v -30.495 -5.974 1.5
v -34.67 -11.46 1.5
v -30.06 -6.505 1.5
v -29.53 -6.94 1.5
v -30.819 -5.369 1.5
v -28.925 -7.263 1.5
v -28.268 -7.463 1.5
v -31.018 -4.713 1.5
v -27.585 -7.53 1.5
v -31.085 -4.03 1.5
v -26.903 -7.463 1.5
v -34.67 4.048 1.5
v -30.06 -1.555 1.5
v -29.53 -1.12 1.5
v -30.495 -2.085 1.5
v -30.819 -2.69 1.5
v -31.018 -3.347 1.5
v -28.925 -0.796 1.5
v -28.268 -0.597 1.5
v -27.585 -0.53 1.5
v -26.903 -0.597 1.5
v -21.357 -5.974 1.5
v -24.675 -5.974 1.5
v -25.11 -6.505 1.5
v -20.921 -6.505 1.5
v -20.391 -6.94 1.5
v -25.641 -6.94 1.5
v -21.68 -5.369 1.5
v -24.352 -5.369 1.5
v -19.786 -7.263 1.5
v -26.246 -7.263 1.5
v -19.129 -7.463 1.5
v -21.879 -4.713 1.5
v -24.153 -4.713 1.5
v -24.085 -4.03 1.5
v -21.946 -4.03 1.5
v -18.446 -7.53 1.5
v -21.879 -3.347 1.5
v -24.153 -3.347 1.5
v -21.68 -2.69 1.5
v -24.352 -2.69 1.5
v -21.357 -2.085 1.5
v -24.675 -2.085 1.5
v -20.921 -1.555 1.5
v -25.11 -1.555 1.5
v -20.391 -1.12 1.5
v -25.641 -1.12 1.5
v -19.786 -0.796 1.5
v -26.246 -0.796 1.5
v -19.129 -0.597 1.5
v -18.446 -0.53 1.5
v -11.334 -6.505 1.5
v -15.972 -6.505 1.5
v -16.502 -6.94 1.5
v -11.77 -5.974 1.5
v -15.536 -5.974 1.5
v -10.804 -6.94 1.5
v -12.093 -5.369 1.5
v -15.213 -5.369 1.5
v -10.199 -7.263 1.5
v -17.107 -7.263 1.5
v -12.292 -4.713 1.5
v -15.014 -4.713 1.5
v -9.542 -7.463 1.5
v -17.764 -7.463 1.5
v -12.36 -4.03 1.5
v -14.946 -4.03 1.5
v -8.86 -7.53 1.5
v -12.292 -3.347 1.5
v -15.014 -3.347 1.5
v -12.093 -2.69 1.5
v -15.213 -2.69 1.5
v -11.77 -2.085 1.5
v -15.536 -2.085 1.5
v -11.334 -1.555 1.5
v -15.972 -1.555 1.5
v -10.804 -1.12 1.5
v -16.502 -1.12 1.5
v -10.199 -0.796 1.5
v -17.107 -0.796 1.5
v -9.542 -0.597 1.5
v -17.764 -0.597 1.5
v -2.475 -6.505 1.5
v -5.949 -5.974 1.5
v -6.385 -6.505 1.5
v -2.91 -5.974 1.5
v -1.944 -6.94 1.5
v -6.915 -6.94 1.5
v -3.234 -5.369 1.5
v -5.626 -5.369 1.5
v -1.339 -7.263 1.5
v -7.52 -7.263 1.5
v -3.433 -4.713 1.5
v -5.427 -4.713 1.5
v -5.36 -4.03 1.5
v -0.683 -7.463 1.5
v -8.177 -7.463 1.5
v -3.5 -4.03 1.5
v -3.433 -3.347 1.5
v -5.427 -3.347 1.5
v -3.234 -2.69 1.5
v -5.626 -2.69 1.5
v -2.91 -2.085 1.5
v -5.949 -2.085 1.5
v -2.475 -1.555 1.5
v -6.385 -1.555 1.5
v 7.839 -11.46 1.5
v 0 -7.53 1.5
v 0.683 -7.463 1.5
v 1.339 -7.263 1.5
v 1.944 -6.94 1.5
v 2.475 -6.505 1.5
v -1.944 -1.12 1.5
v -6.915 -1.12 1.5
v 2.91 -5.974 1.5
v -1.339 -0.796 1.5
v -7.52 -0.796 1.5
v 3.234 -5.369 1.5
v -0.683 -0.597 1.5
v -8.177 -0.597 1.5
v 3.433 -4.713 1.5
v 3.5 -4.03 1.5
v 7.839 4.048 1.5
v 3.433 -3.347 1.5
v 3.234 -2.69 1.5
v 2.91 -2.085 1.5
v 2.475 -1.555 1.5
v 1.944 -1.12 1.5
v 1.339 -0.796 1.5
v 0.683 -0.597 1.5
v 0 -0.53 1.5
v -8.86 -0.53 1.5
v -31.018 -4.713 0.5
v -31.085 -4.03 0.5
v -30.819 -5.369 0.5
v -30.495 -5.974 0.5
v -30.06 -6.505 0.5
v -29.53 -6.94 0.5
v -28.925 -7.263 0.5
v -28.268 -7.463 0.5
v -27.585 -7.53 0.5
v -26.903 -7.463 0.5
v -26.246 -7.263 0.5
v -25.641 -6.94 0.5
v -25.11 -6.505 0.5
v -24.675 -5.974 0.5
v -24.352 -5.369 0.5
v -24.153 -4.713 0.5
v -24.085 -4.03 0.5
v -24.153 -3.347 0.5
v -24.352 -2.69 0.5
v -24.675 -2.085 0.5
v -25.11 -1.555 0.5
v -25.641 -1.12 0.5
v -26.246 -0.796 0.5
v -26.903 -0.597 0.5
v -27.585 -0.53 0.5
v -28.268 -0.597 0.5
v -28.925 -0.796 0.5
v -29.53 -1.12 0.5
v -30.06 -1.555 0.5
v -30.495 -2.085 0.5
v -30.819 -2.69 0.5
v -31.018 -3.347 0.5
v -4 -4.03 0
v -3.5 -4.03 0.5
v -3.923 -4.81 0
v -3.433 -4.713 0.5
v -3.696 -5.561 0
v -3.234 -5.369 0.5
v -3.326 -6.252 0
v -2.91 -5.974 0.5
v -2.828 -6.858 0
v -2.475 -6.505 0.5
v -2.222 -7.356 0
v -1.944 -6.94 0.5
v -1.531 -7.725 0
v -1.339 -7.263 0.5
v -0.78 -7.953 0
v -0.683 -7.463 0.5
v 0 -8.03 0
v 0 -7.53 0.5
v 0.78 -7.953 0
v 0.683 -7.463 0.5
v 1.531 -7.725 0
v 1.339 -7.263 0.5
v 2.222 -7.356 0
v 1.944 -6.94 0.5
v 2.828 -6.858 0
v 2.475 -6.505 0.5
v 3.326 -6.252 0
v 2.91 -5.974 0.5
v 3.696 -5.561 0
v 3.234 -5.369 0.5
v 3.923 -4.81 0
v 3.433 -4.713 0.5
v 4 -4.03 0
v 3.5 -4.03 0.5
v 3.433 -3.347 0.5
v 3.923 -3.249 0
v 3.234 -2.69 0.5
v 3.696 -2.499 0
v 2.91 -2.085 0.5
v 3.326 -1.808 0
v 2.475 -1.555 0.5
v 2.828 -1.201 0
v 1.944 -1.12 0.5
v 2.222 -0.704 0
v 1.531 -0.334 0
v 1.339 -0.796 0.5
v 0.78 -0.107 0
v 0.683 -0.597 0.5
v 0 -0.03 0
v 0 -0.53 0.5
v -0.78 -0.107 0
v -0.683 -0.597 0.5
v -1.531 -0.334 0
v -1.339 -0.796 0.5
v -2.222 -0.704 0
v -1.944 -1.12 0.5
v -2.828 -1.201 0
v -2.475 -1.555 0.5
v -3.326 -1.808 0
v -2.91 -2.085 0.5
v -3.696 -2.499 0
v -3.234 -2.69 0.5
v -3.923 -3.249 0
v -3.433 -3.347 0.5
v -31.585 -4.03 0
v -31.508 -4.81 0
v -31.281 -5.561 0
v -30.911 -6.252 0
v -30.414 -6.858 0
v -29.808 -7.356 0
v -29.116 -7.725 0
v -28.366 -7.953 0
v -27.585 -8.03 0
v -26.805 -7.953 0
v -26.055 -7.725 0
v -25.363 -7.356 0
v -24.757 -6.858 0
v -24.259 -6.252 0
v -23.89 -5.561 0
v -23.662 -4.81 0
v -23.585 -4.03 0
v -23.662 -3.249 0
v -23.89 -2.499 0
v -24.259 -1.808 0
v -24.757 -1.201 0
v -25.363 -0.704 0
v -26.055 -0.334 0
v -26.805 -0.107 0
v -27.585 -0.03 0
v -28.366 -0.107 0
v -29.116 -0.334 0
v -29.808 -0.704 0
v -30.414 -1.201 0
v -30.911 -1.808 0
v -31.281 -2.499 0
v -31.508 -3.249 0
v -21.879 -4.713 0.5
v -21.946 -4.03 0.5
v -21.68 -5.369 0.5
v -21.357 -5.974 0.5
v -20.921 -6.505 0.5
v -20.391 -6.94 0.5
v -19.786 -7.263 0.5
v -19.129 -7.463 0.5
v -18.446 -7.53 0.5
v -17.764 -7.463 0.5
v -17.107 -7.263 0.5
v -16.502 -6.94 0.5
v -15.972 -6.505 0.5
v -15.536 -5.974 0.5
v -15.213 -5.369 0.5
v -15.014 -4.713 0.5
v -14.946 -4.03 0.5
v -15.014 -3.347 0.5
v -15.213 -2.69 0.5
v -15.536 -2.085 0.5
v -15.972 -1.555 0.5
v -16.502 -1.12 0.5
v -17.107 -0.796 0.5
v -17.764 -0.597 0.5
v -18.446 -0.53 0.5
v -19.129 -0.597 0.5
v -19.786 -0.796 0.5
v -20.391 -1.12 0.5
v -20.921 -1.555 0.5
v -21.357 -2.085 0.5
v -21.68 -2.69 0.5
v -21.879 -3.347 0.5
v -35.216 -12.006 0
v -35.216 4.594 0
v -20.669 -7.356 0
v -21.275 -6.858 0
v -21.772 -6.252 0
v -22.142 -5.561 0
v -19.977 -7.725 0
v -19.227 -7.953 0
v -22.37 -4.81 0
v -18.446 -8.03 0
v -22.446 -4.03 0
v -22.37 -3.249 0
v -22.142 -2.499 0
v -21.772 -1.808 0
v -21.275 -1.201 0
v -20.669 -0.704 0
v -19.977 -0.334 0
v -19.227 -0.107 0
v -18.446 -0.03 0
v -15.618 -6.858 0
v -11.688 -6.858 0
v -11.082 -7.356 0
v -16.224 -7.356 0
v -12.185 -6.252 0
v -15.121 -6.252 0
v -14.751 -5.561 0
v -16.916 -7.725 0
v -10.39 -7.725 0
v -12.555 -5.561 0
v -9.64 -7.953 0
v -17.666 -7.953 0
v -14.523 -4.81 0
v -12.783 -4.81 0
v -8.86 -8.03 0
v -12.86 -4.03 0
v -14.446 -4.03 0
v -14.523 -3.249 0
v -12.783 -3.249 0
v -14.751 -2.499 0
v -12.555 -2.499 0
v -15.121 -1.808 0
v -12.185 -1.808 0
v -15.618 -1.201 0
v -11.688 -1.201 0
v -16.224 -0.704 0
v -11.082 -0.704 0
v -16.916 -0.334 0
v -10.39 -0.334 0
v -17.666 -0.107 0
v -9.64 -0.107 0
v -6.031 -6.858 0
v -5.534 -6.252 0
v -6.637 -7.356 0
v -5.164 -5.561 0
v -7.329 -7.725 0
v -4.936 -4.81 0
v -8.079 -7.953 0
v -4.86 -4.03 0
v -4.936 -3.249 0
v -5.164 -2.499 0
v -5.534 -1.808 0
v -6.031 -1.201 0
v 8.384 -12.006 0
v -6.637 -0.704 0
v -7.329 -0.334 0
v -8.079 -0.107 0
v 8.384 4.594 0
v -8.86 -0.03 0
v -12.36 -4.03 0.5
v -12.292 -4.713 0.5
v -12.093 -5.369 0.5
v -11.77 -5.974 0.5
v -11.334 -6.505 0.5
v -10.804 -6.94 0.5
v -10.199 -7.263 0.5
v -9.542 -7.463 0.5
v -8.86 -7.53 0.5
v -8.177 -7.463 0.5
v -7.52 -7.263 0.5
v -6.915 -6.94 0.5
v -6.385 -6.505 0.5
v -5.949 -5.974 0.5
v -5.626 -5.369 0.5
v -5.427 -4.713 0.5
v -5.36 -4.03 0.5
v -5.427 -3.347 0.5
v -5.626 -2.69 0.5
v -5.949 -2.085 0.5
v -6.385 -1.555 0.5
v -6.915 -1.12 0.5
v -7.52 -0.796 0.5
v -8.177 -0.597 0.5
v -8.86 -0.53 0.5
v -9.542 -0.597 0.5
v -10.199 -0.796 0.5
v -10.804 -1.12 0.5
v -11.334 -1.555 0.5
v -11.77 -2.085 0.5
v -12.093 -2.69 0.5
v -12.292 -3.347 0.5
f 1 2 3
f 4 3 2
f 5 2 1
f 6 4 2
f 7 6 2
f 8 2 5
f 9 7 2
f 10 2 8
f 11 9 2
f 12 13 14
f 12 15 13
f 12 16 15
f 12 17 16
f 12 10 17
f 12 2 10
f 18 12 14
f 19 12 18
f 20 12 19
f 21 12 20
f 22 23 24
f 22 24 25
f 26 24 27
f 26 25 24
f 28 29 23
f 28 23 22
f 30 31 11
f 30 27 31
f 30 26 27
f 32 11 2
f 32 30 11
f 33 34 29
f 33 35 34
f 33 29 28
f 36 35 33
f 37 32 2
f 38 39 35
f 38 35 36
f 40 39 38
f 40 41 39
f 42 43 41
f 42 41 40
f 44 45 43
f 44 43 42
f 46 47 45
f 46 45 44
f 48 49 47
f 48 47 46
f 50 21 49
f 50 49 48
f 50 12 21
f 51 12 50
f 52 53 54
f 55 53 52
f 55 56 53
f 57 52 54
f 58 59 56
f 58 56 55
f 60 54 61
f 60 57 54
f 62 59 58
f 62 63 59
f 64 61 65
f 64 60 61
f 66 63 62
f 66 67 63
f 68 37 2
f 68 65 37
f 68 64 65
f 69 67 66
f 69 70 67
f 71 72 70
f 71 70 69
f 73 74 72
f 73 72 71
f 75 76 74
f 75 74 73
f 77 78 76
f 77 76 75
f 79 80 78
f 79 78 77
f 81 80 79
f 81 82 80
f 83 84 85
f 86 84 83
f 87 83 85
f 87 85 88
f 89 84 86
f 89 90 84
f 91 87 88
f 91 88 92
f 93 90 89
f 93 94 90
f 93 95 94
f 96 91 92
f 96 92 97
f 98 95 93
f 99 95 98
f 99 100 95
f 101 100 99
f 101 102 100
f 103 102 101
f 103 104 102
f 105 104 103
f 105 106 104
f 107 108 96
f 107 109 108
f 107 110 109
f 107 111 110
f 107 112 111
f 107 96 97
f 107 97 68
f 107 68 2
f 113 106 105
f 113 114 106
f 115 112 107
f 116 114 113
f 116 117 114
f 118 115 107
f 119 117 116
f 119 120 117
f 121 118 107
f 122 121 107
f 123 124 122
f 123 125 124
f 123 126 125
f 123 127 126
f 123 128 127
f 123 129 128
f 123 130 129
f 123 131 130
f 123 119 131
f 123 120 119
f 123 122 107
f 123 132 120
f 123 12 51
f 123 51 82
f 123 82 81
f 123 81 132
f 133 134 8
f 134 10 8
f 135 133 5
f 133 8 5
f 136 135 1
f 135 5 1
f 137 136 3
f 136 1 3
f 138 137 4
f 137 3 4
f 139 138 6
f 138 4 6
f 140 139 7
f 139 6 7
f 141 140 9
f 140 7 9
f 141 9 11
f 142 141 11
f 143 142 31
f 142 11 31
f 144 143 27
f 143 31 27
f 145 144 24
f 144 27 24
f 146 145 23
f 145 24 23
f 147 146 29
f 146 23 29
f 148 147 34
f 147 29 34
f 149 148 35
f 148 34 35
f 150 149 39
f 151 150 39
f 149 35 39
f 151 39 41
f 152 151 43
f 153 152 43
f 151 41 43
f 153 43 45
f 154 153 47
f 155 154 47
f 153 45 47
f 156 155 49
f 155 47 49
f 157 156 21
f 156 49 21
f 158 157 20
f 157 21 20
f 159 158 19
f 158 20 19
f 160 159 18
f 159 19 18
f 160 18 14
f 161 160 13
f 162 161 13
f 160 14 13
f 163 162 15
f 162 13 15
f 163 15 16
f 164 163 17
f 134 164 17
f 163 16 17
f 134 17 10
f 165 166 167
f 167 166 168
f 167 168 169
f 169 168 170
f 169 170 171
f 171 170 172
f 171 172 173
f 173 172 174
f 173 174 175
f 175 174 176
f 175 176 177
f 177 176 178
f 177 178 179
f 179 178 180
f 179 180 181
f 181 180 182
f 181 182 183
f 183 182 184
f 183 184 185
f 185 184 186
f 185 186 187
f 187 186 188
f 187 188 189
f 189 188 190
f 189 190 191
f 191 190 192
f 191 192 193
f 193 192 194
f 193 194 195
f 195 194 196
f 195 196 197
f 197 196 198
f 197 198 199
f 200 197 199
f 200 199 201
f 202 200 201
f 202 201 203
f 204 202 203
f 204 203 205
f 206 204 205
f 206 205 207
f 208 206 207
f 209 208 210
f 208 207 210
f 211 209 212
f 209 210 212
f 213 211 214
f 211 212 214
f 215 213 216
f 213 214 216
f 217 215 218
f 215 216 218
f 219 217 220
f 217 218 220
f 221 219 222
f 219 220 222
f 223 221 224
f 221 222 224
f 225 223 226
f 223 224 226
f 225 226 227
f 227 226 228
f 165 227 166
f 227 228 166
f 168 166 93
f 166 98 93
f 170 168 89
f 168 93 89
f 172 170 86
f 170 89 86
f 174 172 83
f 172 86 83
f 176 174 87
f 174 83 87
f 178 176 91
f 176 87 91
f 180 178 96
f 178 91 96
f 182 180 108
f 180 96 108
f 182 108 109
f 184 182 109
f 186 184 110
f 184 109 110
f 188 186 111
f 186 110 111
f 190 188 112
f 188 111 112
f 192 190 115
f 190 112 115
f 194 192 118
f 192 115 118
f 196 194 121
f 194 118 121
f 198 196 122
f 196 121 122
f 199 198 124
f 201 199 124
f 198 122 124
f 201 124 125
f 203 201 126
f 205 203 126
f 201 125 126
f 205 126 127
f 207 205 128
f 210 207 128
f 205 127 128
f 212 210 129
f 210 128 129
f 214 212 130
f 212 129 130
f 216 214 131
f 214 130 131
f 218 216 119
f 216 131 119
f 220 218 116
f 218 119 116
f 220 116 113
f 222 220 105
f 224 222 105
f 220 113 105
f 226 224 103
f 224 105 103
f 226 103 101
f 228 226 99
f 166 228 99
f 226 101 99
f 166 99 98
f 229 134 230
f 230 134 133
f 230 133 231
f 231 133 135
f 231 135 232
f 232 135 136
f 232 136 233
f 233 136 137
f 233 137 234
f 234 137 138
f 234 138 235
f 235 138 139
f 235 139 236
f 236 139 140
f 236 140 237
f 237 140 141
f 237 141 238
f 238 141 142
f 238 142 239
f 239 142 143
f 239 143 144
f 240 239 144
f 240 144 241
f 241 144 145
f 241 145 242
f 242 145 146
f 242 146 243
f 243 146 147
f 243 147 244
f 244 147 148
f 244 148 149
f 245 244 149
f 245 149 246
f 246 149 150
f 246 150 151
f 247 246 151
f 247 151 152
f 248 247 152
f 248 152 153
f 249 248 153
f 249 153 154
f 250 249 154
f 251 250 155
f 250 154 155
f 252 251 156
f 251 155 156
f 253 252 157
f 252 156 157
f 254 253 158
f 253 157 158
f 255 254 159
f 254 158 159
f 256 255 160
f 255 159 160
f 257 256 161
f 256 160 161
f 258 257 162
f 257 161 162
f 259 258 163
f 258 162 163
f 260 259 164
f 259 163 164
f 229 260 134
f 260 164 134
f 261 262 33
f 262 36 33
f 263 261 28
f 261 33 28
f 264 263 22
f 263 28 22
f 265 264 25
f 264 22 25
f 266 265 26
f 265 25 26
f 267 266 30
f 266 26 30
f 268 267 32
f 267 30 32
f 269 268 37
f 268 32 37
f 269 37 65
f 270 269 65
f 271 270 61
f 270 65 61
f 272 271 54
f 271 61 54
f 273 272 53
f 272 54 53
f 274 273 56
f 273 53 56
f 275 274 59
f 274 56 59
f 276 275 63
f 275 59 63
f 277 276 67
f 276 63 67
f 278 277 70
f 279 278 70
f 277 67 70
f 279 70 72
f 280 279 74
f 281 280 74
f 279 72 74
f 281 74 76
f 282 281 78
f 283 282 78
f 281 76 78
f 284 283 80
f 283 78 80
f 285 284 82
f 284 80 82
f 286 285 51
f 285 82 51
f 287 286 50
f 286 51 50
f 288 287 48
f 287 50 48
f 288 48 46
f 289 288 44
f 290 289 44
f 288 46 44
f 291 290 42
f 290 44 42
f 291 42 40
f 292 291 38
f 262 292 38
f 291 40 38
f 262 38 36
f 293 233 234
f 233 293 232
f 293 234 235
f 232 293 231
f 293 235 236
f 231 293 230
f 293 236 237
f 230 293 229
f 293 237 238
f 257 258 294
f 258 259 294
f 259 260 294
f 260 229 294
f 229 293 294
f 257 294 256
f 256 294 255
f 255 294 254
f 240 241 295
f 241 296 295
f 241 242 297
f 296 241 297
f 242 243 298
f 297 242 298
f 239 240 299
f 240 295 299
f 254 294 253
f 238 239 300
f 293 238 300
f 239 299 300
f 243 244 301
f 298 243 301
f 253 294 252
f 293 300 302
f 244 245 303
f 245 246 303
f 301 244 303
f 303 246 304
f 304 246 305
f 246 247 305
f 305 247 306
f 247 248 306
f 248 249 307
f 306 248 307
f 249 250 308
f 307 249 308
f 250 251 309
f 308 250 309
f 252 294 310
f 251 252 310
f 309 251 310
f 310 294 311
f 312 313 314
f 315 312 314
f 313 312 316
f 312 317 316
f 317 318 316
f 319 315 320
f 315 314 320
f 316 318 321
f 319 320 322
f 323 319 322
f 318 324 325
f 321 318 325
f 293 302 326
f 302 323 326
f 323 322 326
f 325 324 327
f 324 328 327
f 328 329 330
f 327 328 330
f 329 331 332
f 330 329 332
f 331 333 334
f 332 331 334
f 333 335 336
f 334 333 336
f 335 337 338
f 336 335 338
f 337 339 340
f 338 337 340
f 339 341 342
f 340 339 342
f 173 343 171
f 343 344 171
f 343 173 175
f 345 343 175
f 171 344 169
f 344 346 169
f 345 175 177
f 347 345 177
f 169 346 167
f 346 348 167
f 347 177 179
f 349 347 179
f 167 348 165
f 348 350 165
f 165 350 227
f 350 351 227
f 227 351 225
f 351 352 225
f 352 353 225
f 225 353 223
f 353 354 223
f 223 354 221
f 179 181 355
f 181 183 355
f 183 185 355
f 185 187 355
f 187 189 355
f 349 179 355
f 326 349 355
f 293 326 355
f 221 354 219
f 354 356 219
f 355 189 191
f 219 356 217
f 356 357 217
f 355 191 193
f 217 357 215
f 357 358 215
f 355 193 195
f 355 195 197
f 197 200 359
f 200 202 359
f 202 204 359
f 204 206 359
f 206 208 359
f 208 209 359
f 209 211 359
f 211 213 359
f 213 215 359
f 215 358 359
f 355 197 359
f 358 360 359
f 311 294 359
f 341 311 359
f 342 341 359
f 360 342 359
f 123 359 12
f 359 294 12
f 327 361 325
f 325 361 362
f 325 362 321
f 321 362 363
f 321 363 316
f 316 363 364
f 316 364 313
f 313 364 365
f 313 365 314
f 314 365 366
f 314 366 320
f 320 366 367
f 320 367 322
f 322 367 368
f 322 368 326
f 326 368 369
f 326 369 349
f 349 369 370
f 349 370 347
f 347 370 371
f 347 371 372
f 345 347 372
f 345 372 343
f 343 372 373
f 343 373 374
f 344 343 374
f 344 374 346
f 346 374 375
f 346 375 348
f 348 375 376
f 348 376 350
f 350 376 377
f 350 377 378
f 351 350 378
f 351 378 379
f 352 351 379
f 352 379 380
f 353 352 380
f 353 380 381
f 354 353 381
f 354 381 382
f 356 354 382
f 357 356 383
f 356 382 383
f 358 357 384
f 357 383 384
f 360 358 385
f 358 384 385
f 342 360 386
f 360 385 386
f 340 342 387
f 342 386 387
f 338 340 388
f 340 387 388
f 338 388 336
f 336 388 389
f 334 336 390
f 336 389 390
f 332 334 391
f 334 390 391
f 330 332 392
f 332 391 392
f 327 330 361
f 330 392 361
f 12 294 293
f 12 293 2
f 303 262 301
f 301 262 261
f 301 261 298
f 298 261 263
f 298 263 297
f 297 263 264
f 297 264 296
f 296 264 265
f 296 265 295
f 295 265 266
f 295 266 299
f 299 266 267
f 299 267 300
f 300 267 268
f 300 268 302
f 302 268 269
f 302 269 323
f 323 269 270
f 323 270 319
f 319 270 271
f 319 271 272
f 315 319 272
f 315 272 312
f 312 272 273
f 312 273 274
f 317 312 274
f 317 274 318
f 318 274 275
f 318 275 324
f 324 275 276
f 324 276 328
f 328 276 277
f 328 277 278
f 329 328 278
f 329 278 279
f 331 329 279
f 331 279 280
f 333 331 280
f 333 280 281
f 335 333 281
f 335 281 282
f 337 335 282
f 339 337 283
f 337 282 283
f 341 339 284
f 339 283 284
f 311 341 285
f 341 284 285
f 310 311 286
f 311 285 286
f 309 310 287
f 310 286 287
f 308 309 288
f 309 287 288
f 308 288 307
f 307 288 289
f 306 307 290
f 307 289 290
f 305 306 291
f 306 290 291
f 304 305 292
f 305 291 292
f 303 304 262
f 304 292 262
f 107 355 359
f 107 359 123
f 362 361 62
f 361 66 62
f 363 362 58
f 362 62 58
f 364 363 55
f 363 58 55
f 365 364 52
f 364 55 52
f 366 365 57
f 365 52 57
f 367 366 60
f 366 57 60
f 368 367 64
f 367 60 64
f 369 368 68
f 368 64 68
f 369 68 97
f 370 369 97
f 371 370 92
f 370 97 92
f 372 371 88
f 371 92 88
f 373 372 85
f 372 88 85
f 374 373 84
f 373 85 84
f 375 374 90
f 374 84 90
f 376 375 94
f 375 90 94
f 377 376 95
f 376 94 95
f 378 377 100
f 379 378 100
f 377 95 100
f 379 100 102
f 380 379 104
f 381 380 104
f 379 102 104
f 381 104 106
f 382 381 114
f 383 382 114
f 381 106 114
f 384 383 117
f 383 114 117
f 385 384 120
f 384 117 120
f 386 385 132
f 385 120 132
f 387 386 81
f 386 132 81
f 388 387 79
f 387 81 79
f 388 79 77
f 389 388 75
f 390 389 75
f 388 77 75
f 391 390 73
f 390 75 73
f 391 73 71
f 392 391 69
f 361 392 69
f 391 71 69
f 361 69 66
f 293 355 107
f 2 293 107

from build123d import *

# Parameters (mm, degrees)
F0_W           = 43.6
F0_H           = 16.6
F1_DEPTH       = 1.5
F1_TAPER       = 20
F2_D           = 7
F2_CSINK_D     = 8
F2_CSINK_ANGLE = 90


with BuildPart() as f1:
    # F0 (on Top) → F1 (new body)
    with BuildSketch(Plane.XY):
        with Locations((-13.4155156434, -3.7059903711)):
            Rectangle(F0_W, F0_H)
    extrude(amount=F1_DEPTH, taper=F1_TAPER)

    # F2 (through all)
    with Locations(Plane(origin=(0, 0, 0), x_dir=(1, 0, 0), z_dir=(0, 0, -1))):
        with Locations((-27.5853313506, 4.0297852829), (-18.4464138001, 4.0297852829), (-8.8595086709, 4.0297852829), (0, 4.0297852829)):
            CounterSinkHole(F2_D / 2, F2_CSINK_D / 2, counter_sink_angle=F2_CSINK_ANGLE)


solid = f1.part
